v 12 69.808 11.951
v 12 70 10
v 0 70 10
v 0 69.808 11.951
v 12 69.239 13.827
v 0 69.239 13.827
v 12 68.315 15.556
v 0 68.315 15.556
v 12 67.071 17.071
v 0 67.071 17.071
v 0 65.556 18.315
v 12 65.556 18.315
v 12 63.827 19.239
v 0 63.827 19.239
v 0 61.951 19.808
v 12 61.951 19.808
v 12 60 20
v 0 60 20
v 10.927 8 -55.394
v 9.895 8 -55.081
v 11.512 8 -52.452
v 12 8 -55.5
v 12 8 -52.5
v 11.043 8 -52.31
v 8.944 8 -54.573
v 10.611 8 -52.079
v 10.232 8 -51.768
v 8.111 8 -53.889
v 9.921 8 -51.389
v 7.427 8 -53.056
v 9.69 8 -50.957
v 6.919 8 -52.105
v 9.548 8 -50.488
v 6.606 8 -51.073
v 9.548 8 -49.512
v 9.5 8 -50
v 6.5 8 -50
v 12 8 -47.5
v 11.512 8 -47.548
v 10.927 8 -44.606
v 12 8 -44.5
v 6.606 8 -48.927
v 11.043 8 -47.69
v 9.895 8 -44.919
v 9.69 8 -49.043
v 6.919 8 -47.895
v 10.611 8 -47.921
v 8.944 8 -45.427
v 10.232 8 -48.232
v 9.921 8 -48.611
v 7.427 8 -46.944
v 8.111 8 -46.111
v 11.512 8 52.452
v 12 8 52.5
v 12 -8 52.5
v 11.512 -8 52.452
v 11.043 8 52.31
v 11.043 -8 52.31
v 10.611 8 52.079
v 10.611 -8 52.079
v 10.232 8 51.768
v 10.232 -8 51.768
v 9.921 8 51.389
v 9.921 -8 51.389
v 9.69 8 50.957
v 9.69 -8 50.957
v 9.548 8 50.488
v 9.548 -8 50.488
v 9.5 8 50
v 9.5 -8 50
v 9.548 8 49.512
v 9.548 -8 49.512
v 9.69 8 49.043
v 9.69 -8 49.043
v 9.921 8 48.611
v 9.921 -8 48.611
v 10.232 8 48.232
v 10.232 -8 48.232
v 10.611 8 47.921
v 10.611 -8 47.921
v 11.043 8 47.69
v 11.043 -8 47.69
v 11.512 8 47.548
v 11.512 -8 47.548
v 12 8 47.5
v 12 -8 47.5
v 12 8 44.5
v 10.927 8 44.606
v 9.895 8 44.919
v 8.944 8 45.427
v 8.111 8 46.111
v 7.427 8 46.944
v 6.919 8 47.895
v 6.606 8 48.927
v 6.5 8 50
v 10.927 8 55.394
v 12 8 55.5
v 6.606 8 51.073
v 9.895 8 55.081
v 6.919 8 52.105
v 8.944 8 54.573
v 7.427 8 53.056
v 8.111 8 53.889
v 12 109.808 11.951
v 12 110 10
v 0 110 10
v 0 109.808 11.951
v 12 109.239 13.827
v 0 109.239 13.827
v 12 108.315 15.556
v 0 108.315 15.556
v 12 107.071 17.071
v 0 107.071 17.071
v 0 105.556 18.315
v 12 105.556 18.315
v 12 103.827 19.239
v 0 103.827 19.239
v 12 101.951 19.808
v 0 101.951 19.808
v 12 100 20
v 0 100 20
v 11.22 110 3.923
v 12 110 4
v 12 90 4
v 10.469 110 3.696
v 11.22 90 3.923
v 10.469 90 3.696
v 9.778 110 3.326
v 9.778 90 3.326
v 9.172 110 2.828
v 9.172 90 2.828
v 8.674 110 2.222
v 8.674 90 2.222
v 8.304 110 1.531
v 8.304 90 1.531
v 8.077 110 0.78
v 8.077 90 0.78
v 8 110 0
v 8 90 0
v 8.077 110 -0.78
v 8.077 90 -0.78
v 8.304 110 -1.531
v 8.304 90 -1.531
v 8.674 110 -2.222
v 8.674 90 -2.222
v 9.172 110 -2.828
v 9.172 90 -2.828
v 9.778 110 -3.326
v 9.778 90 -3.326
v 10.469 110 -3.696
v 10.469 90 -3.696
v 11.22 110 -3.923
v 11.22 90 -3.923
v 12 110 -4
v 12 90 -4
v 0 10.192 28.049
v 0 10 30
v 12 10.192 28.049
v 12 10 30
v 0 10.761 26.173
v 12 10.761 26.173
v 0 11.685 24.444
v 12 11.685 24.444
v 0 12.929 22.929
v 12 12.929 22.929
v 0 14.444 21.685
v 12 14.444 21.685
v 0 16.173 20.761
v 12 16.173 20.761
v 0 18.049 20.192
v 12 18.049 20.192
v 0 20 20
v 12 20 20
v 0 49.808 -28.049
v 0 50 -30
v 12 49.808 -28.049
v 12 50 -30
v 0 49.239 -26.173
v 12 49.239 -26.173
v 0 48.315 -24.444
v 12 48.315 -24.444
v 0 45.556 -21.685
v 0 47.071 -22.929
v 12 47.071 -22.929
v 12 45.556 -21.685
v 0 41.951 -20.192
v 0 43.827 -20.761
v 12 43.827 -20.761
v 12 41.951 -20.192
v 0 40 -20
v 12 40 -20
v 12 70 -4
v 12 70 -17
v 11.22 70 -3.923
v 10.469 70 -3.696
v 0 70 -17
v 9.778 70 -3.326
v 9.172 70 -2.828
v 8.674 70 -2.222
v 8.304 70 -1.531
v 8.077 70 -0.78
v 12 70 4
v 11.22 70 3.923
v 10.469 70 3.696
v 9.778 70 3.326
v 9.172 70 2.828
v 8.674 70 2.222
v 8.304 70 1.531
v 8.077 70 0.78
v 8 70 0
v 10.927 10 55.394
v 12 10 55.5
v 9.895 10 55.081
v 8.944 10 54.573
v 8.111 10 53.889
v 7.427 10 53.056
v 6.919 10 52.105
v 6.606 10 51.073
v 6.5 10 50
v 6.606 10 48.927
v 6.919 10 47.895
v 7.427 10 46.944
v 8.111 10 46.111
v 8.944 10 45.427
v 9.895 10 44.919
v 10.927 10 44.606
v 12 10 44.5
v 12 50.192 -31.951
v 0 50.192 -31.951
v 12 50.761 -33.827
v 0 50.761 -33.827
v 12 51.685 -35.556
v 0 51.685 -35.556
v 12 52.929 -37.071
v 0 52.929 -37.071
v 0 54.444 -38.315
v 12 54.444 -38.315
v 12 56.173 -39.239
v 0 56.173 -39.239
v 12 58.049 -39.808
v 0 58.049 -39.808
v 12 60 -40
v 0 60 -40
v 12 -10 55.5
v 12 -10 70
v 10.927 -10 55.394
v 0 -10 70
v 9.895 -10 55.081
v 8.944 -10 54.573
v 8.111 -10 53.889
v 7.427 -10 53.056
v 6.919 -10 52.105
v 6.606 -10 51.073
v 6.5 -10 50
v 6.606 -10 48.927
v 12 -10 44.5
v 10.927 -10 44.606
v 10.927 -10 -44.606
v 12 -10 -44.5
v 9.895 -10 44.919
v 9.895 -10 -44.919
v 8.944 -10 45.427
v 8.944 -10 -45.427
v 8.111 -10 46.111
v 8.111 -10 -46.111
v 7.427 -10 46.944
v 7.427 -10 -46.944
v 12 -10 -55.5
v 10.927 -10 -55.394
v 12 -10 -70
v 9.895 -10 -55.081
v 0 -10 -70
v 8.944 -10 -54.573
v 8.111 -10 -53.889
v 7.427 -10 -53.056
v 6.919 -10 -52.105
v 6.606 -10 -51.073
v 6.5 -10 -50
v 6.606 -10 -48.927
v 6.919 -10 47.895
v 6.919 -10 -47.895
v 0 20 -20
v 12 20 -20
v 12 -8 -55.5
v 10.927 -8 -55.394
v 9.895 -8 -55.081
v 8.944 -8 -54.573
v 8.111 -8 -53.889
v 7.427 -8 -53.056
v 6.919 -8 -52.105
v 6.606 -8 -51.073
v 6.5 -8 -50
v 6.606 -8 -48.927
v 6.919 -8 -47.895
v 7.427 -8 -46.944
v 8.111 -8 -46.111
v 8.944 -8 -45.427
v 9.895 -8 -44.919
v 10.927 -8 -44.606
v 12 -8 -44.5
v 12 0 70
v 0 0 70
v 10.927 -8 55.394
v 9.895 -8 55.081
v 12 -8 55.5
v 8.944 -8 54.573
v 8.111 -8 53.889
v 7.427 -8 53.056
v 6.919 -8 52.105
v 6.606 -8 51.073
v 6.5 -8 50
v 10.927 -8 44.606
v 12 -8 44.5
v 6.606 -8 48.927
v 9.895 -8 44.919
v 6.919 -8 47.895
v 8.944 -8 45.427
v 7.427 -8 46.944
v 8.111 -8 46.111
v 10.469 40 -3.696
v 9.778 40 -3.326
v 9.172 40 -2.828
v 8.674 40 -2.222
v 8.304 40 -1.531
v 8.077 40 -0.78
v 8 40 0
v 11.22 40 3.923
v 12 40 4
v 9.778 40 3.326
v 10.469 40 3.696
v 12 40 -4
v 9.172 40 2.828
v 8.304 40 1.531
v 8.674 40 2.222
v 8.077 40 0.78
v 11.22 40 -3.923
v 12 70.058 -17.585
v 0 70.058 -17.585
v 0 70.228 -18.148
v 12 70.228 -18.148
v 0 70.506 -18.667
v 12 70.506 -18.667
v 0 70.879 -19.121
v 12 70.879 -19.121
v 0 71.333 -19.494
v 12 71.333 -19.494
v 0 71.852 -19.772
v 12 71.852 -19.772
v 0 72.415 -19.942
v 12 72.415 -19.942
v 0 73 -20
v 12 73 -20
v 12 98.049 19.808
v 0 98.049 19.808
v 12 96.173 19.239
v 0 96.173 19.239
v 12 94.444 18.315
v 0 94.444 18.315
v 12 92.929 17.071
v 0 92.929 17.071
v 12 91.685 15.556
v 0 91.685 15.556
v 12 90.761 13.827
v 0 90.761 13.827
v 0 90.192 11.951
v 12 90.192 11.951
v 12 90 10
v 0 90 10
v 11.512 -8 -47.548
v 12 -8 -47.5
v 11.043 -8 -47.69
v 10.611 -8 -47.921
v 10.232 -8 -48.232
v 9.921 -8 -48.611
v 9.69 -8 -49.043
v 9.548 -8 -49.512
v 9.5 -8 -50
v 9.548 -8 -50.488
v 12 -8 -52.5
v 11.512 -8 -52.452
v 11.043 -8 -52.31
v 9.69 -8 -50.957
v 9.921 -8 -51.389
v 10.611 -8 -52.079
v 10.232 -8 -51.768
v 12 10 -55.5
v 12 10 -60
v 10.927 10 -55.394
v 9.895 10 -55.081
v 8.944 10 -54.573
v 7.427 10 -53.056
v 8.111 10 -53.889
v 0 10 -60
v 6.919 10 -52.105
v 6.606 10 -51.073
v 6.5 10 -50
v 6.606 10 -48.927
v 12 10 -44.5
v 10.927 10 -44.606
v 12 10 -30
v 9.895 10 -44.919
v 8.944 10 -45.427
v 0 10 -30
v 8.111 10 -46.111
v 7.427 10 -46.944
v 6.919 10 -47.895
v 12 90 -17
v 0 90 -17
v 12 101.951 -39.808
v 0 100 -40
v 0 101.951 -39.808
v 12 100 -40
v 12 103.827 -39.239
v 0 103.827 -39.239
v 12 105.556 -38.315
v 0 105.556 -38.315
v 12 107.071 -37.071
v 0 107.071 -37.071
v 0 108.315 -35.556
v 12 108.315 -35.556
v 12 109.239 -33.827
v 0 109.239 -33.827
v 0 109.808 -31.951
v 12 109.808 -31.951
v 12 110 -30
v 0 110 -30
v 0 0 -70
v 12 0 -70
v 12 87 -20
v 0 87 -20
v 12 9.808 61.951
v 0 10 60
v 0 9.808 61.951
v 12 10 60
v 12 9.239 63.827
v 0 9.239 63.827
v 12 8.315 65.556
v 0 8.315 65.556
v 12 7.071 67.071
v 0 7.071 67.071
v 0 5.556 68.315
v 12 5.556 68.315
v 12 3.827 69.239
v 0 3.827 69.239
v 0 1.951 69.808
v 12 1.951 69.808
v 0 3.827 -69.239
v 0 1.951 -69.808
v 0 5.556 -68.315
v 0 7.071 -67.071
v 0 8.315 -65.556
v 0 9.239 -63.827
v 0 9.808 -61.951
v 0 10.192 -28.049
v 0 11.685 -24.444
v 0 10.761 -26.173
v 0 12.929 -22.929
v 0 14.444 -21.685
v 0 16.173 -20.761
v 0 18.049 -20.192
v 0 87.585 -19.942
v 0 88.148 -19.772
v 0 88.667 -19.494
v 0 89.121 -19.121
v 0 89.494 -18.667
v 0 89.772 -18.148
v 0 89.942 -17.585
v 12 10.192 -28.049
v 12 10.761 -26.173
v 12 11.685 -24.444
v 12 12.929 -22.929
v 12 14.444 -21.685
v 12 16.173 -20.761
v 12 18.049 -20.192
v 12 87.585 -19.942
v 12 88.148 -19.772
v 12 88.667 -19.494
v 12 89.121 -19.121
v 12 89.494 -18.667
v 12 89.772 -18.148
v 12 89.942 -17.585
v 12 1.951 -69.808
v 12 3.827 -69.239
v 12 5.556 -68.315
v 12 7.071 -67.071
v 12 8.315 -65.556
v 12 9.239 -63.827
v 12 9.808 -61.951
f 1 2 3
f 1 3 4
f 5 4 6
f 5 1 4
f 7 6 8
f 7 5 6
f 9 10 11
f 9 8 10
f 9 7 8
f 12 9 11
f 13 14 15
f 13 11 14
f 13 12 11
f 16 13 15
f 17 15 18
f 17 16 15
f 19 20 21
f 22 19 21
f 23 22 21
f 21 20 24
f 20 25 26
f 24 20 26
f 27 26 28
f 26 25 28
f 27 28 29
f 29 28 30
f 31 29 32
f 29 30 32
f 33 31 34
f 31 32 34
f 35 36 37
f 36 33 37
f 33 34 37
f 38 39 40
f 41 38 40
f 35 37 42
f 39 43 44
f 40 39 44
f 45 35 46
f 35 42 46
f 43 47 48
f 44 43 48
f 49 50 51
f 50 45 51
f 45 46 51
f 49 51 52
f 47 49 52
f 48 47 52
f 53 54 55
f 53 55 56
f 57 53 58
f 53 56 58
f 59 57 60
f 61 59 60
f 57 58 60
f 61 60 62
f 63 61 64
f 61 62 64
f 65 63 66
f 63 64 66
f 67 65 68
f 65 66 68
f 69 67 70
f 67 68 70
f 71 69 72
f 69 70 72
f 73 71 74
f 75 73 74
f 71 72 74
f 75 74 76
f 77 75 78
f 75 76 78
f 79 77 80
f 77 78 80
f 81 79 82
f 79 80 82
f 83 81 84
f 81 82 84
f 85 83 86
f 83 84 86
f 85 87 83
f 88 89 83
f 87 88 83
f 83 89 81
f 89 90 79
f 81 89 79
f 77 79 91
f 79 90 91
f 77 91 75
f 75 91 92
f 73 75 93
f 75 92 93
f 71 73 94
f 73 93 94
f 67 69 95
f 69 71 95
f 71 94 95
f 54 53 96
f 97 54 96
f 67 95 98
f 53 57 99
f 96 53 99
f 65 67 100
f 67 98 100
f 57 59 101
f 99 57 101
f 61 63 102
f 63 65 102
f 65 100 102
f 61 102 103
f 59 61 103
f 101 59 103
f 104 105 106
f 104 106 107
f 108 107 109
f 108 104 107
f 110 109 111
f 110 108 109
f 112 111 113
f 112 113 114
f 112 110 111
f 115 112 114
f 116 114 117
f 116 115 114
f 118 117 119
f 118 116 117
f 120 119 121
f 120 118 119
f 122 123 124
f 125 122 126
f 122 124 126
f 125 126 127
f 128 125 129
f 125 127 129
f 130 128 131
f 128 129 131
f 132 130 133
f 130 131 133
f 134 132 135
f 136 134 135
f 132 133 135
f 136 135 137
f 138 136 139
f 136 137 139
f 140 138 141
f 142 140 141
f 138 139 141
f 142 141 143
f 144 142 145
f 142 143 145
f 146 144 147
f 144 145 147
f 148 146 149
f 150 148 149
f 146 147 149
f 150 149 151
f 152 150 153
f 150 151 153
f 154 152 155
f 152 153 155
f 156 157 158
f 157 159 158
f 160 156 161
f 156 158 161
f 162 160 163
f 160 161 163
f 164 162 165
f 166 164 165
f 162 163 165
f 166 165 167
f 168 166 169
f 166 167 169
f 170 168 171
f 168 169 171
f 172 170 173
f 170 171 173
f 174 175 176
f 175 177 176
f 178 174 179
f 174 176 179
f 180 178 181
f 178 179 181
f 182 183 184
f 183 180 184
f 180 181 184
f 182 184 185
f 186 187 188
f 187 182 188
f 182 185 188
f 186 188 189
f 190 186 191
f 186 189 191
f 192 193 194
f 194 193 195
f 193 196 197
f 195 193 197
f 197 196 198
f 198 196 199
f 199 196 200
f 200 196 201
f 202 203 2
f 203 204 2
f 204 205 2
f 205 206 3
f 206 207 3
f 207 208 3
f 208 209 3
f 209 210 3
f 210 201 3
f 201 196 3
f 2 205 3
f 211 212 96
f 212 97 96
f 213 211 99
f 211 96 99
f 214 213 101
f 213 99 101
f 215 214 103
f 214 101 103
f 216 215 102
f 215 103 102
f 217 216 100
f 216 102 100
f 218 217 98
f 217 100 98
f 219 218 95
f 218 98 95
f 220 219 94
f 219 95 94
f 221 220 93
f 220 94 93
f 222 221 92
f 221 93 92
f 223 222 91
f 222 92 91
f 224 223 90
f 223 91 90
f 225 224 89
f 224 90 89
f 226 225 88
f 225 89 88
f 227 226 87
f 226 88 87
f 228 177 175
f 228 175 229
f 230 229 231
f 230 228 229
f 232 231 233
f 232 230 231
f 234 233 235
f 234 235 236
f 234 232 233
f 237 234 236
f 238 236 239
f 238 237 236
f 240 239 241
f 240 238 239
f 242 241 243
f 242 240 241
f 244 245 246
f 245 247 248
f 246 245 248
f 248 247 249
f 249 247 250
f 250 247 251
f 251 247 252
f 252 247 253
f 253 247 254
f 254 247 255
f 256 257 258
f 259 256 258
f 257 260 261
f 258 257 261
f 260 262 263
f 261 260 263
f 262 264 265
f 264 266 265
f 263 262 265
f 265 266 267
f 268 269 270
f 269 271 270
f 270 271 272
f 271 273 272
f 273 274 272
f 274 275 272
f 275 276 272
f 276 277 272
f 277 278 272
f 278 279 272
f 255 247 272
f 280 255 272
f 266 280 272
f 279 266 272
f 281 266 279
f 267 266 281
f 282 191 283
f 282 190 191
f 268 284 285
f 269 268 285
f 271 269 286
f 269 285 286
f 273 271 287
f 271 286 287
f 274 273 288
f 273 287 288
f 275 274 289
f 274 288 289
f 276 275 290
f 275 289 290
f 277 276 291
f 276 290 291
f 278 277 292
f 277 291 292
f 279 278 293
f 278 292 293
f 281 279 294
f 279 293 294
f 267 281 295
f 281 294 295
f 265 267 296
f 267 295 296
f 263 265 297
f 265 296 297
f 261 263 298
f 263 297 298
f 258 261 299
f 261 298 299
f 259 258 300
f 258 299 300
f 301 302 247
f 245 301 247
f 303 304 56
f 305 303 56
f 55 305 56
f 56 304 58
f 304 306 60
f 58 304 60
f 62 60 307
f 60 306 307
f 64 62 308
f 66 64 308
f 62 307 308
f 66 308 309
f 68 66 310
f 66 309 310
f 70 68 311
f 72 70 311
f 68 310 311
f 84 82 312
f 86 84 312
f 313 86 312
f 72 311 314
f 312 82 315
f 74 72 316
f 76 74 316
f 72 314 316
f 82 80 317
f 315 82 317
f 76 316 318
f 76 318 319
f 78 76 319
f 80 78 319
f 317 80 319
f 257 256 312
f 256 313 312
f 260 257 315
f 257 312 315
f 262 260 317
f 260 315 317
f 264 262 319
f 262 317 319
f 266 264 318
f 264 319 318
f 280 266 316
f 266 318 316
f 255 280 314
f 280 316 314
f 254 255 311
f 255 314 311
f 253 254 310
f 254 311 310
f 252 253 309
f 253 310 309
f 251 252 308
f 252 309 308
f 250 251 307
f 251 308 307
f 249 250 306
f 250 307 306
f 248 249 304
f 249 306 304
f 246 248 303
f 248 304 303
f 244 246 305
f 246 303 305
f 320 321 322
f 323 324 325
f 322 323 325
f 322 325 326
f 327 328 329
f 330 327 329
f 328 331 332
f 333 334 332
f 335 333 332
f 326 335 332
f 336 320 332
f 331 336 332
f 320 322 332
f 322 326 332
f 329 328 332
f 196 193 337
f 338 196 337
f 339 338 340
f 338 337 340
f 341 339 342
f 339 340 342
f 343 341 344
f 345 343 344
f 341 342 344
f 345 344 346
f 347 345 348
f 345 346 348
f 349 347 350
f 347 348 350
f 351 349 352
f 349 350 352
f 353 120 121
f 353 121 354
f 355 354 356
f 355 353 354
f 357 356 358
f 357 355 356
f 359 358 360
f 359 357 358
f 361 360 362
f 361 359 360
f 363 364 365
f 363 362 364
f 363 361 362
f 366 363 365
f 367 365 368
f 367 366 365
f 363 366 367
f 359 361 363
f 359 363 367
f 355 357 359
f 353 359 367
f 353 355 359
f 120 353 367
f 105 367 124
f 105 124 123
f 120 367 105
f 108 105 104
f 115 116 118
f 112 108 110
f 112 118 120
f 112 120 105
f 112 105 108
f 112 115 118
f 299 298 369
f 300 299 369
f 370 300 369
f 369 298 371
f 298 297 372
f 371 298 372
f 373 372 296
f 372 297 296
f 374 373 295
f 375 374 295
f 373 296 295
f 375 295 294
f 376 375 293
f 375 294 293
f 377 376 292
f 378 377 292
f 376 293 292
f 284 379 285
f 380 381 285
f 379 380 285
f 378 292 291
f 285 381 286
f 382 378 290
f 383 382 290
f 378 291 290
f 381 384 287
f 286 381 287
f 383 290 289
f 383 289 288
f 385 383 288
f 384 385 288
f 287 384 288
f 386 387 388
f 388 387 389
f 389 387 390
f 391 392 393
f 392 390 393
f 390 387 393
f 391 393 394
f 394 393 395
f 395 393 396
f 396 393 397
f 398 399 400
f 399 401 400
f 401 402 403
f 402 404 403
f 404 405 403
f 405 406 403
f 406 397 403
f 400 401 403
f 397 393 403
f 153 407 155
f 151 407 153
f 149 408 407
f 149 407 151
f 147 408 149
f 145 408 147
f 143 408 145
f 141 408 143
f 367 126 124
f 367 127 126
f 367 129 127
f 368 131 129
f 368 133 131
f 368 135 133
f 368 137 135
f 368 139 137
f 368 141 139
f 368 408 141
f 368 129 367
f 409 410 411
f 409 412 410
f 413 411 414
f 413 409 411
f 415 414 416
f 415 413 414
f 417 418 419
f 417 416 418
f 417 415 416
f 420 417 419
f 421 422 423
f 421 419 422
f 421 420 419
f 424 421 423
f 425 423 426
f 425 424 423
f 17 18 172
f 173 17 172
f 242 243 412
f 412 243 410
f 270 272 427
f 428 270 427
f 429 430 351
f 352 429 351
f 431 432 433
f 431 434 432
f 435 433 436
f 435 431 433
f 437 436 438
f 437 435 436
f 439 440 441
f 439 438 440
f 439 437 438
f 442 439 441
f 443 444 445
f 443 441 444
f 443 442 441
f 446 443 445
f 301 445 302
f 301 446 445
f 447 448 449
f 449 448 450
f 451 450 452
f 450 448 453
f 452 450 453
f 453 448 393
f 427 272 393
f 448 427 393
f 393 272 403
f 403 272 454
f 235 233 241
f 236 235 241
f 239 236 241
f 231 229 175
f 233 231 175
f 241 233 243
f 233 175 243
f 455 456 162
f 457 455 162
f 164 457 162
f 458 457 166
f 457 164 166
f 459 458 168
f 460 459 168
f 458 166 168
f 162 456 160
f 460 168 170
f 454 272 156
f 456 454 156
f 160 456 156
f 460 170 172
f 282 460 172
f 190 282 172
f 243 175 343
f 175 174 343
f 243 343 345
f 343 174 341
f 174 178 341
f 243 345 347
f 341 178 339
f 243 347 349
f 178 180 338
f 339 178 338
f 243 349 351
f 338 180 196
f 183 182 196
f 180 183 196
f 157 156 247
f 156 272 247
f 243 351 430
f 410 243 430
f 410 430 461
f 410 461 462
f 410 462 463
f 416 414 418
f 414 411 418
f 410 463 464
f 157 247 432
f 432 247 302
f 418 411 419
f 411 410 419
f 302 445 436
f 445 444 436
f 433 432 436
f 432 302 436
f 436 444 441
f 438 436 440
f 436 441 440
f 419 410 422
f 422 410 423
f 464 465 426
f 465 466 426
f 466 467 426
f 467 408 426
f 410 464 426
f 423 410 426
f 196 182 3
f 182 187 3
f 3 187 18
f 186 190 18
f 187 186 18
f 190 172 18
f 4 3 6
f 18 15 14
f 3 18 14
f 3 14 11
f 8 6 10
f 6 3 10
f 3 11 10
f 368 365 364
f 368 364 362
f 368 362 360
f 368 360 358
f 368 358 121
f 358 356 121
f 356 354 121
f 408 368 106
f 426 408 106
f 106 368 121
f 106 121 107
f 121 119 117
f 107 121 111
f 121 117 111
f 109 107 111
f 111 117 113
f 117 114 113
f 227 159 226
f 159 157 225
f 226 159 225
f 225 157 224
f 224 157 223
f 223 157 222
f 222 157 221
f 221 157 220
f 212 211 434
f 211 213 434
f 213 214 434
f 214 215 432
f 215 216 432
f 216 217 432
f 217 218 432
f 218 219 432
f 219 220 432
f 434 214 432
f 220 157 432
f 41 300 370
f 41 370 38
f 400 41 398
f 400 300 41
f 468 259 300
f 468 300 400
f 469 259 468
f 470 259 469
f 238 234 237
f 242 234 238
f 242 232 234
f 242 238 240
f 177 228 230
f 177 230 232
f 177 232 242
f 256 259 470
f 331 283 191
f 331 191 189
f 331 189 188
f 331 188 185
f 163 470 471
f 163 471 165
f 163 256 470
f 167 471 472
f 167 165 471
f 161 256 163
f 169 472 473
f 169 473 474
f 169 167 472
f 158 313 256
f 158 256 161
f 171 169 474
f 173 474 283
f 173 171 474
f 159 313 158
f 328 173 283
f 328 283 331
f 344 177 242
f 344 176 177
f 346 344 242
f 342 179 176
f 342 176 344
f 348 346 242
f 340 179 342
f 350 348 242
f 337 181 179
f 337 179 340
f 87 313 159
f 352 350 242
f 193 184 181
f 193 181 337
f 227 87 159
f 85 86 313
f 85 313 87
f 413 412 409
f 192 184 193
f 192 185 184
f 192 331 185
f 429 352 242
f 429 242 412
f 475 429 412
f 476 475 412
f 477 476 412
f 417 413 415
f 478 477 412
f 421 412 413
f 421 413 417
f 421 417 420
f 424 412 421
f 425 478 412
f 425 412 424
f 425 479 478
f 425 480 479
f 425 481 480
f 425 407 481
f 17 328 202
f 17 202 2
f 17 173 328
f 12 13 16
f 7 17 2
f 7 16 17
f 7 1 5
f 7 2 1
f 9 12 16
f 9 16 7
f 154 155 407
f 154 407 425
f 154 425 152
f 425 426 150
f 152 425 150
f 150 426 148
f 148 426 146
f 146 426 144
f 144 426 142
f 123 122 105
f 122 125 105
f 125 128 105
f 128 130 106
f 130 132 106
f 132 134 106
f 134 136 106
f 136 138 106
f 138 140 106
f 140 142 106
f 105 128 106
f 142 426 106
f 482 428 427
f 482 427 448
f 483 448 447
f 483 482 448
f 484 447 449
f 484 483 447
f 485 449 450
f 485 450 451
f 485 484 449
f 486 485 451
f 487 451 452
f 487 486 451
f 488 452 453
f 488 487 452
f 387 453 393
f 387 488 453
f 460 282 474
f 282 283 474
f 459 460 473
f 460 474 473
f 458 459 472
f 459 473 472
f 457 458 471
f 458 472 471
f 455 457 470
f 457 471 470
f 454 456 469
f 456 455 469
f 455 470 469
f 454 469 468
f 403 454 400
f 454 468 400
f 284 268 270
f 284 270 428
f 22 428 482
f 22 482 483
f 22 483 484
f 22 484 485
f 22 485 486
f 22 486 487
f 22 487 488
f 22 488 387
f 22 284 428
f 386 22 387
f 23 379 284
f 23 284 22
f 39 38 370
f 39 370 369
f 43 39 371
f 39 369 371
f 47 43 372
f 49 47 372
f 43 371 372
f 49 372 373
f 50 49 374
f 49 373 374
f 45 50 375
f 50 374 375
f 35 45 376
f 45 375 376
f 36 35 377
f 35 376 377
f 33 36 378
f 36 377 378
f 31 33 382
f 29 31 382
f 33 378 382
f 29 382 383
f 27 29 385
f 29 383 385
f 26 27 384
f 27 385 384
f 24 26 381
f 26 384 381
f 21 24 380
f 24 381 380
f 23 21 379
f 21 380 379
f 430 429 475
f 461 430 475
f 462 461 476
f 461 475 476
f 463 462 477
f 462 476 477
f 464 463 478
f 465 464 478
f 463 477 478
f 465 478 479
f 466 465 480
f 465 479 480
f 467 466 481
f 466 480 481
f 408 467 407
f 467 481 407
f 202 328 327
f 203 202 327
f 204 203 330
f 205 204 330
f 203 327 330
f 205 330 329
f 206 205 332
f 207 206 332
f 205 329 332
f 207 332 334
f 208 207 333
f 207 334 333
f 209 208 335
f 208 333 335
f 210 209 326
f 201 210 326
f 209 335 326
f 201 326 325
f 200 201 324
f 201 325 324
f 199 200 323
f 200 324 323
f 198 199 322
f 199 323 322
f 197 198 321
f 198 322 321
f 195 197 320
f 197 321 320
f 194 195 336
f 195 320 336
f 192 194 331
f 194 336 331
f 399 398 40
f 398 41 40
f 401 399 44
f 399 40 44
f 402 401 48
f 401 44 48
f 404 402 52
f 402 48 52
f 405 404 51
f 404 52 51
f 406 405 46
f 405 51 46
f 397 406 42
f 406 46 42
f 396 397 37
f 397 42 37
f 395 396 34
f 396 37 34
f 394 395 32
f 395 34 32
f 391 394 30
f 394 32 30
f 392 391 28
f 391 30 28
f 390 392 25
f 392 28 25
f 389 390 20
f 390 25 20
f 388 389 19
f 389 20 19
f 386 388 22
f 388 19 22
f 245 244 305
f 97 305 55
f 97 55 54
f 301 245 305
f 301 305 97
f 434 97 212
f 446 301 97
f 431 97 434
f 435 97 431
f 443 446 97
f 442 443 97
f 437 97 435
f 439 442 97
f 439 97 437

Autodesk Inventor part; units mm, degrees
ref_plane "YZ Plane" through (0, 0, 0) normal (1, 0, 0) x (0, 1, 0)
ref_plane "XZ Plane" through (0, 0, 0) normal (0, 1, 0) x (-1, 0, 0)
ref_plane "XY Plane" through (0, 0, 0) normal (0, 0, 1) x (1, 0, 0)
sketch "Sketch1" plane through (0, 0, 0) normal (1, 0, 0) x (0, 1, 0)
  line L0 (-10, -70) -> (10, -70)
  line L1 (10, -70) -> (10, 70)
  line L2 (10, 70) -> (-10, 70)
  line L3 (-10, 70) -> (-10, -70)
  line L4 (-10, -70) -> (10, 70) construction
  line L5 (10, -70) -> (-10, 70) construction
  line L6 (10, 0) -> (70, 0)
  line L7 (70, 0) -> (70, 20)
  line L8 (70, 20) -> (10, 20)
  line L9 (10, 20) -> (10, 0)
  line L10 (70, 0) -> (70, -20)
  line L11 (70, -20) -> (10, -20)
  line L12 (10, -20) -> (10, 0)
  line L13 (90, 20) -> (110, 20)
  line L14 (110, 20) -> (110, -20)
  line L15 (110, -20) -> (90, -20)
  line L16 (90, -20) -> (90, 20)
  line L17 (110, -20) -> (50, -20)
  line L18 (50, -20) -> (50, -40)
  line L19 (50, -40) -> (110, -40)
  line L20 (110, -40) -> (110, -20)
  point P0 (0, 0)
  point P1 (90, -20)
  point P2 (70, -20)
  point P3 (50, -20)
  dimension "d0" = 20
  dimension "d1" = 140
  dimension "d2" = 80
  dimension "d3" = 20
  dimension "d17" = 60
  dimension "d18" = 20
  dimension "d19" = 20
  dimension "d20" = 20
extrude "Extrusion1" add sketch "Sketch1" along normal blind 12
fillet "Fillet1" radius 10 10 edges at (6, 10, 70) (6, 10, -70) (6, 10, 20) (6, 10, -20) (6, 70, 20) (6, 90, 20) (6, 110, 20) (6, 110, -40) (6, 50, -40) (6, 50, -20)
fillet "Fillet1" radius 3 2 edges at (6, 70, -20) (6, 90, -20)
sketch "Sketch2" plane through (0, 10, 60) normal (0, 1, 0) x (1, 0, 0)
  line L0 (12, -10) -> (12, 130) projected
  line L1 (0, -10) -> (12, -10) projected
  line L2 (12, 130) -> (0, 130) projected
  point P0 (0, 60)
  point P1 (12, 10)
  point P2 (12, 110)
  dimension "d7" = 100
  dimension "d8" = 20
  dimension "d9" = 20
hole "Hole1" at (12, 10, 50) at (12, 10, -50) direction (0, -1, 0) diameter 5 end through all counterbore diameter 11 counterbore depth 2
sketch "Sketch3" plane through (0, 110, 10) normal (0, 1, 0) x (1, 0, 0)
  line L0 (12, -37.5) -> (12, 57.5) projected
  point P0 (0, 10)
  point P1 (12, 10)
hole "Hole2" at (12, 110, 0) direction (0, -1, 0) diameter 8 depth 70
sketch "Sketch4" plane through (0, -10, -70) normal (0, -1, 0) x (1, 0, 0)
  arc A0 (12, 122.5) -> (12, 117.5) centre (12, 120) ccw projected
  arc A1 (12, 22.5) -> (12, 17.5) centre (12, 20) ccw projected
  point P0 (0, 70)
hole "Hole3" at (12, -10, 50) at (12, -10, -50) direction (0, 1, 0) diameter 11 depth 2
equation "\"d9\" = d8"
properties part number "clamp"
